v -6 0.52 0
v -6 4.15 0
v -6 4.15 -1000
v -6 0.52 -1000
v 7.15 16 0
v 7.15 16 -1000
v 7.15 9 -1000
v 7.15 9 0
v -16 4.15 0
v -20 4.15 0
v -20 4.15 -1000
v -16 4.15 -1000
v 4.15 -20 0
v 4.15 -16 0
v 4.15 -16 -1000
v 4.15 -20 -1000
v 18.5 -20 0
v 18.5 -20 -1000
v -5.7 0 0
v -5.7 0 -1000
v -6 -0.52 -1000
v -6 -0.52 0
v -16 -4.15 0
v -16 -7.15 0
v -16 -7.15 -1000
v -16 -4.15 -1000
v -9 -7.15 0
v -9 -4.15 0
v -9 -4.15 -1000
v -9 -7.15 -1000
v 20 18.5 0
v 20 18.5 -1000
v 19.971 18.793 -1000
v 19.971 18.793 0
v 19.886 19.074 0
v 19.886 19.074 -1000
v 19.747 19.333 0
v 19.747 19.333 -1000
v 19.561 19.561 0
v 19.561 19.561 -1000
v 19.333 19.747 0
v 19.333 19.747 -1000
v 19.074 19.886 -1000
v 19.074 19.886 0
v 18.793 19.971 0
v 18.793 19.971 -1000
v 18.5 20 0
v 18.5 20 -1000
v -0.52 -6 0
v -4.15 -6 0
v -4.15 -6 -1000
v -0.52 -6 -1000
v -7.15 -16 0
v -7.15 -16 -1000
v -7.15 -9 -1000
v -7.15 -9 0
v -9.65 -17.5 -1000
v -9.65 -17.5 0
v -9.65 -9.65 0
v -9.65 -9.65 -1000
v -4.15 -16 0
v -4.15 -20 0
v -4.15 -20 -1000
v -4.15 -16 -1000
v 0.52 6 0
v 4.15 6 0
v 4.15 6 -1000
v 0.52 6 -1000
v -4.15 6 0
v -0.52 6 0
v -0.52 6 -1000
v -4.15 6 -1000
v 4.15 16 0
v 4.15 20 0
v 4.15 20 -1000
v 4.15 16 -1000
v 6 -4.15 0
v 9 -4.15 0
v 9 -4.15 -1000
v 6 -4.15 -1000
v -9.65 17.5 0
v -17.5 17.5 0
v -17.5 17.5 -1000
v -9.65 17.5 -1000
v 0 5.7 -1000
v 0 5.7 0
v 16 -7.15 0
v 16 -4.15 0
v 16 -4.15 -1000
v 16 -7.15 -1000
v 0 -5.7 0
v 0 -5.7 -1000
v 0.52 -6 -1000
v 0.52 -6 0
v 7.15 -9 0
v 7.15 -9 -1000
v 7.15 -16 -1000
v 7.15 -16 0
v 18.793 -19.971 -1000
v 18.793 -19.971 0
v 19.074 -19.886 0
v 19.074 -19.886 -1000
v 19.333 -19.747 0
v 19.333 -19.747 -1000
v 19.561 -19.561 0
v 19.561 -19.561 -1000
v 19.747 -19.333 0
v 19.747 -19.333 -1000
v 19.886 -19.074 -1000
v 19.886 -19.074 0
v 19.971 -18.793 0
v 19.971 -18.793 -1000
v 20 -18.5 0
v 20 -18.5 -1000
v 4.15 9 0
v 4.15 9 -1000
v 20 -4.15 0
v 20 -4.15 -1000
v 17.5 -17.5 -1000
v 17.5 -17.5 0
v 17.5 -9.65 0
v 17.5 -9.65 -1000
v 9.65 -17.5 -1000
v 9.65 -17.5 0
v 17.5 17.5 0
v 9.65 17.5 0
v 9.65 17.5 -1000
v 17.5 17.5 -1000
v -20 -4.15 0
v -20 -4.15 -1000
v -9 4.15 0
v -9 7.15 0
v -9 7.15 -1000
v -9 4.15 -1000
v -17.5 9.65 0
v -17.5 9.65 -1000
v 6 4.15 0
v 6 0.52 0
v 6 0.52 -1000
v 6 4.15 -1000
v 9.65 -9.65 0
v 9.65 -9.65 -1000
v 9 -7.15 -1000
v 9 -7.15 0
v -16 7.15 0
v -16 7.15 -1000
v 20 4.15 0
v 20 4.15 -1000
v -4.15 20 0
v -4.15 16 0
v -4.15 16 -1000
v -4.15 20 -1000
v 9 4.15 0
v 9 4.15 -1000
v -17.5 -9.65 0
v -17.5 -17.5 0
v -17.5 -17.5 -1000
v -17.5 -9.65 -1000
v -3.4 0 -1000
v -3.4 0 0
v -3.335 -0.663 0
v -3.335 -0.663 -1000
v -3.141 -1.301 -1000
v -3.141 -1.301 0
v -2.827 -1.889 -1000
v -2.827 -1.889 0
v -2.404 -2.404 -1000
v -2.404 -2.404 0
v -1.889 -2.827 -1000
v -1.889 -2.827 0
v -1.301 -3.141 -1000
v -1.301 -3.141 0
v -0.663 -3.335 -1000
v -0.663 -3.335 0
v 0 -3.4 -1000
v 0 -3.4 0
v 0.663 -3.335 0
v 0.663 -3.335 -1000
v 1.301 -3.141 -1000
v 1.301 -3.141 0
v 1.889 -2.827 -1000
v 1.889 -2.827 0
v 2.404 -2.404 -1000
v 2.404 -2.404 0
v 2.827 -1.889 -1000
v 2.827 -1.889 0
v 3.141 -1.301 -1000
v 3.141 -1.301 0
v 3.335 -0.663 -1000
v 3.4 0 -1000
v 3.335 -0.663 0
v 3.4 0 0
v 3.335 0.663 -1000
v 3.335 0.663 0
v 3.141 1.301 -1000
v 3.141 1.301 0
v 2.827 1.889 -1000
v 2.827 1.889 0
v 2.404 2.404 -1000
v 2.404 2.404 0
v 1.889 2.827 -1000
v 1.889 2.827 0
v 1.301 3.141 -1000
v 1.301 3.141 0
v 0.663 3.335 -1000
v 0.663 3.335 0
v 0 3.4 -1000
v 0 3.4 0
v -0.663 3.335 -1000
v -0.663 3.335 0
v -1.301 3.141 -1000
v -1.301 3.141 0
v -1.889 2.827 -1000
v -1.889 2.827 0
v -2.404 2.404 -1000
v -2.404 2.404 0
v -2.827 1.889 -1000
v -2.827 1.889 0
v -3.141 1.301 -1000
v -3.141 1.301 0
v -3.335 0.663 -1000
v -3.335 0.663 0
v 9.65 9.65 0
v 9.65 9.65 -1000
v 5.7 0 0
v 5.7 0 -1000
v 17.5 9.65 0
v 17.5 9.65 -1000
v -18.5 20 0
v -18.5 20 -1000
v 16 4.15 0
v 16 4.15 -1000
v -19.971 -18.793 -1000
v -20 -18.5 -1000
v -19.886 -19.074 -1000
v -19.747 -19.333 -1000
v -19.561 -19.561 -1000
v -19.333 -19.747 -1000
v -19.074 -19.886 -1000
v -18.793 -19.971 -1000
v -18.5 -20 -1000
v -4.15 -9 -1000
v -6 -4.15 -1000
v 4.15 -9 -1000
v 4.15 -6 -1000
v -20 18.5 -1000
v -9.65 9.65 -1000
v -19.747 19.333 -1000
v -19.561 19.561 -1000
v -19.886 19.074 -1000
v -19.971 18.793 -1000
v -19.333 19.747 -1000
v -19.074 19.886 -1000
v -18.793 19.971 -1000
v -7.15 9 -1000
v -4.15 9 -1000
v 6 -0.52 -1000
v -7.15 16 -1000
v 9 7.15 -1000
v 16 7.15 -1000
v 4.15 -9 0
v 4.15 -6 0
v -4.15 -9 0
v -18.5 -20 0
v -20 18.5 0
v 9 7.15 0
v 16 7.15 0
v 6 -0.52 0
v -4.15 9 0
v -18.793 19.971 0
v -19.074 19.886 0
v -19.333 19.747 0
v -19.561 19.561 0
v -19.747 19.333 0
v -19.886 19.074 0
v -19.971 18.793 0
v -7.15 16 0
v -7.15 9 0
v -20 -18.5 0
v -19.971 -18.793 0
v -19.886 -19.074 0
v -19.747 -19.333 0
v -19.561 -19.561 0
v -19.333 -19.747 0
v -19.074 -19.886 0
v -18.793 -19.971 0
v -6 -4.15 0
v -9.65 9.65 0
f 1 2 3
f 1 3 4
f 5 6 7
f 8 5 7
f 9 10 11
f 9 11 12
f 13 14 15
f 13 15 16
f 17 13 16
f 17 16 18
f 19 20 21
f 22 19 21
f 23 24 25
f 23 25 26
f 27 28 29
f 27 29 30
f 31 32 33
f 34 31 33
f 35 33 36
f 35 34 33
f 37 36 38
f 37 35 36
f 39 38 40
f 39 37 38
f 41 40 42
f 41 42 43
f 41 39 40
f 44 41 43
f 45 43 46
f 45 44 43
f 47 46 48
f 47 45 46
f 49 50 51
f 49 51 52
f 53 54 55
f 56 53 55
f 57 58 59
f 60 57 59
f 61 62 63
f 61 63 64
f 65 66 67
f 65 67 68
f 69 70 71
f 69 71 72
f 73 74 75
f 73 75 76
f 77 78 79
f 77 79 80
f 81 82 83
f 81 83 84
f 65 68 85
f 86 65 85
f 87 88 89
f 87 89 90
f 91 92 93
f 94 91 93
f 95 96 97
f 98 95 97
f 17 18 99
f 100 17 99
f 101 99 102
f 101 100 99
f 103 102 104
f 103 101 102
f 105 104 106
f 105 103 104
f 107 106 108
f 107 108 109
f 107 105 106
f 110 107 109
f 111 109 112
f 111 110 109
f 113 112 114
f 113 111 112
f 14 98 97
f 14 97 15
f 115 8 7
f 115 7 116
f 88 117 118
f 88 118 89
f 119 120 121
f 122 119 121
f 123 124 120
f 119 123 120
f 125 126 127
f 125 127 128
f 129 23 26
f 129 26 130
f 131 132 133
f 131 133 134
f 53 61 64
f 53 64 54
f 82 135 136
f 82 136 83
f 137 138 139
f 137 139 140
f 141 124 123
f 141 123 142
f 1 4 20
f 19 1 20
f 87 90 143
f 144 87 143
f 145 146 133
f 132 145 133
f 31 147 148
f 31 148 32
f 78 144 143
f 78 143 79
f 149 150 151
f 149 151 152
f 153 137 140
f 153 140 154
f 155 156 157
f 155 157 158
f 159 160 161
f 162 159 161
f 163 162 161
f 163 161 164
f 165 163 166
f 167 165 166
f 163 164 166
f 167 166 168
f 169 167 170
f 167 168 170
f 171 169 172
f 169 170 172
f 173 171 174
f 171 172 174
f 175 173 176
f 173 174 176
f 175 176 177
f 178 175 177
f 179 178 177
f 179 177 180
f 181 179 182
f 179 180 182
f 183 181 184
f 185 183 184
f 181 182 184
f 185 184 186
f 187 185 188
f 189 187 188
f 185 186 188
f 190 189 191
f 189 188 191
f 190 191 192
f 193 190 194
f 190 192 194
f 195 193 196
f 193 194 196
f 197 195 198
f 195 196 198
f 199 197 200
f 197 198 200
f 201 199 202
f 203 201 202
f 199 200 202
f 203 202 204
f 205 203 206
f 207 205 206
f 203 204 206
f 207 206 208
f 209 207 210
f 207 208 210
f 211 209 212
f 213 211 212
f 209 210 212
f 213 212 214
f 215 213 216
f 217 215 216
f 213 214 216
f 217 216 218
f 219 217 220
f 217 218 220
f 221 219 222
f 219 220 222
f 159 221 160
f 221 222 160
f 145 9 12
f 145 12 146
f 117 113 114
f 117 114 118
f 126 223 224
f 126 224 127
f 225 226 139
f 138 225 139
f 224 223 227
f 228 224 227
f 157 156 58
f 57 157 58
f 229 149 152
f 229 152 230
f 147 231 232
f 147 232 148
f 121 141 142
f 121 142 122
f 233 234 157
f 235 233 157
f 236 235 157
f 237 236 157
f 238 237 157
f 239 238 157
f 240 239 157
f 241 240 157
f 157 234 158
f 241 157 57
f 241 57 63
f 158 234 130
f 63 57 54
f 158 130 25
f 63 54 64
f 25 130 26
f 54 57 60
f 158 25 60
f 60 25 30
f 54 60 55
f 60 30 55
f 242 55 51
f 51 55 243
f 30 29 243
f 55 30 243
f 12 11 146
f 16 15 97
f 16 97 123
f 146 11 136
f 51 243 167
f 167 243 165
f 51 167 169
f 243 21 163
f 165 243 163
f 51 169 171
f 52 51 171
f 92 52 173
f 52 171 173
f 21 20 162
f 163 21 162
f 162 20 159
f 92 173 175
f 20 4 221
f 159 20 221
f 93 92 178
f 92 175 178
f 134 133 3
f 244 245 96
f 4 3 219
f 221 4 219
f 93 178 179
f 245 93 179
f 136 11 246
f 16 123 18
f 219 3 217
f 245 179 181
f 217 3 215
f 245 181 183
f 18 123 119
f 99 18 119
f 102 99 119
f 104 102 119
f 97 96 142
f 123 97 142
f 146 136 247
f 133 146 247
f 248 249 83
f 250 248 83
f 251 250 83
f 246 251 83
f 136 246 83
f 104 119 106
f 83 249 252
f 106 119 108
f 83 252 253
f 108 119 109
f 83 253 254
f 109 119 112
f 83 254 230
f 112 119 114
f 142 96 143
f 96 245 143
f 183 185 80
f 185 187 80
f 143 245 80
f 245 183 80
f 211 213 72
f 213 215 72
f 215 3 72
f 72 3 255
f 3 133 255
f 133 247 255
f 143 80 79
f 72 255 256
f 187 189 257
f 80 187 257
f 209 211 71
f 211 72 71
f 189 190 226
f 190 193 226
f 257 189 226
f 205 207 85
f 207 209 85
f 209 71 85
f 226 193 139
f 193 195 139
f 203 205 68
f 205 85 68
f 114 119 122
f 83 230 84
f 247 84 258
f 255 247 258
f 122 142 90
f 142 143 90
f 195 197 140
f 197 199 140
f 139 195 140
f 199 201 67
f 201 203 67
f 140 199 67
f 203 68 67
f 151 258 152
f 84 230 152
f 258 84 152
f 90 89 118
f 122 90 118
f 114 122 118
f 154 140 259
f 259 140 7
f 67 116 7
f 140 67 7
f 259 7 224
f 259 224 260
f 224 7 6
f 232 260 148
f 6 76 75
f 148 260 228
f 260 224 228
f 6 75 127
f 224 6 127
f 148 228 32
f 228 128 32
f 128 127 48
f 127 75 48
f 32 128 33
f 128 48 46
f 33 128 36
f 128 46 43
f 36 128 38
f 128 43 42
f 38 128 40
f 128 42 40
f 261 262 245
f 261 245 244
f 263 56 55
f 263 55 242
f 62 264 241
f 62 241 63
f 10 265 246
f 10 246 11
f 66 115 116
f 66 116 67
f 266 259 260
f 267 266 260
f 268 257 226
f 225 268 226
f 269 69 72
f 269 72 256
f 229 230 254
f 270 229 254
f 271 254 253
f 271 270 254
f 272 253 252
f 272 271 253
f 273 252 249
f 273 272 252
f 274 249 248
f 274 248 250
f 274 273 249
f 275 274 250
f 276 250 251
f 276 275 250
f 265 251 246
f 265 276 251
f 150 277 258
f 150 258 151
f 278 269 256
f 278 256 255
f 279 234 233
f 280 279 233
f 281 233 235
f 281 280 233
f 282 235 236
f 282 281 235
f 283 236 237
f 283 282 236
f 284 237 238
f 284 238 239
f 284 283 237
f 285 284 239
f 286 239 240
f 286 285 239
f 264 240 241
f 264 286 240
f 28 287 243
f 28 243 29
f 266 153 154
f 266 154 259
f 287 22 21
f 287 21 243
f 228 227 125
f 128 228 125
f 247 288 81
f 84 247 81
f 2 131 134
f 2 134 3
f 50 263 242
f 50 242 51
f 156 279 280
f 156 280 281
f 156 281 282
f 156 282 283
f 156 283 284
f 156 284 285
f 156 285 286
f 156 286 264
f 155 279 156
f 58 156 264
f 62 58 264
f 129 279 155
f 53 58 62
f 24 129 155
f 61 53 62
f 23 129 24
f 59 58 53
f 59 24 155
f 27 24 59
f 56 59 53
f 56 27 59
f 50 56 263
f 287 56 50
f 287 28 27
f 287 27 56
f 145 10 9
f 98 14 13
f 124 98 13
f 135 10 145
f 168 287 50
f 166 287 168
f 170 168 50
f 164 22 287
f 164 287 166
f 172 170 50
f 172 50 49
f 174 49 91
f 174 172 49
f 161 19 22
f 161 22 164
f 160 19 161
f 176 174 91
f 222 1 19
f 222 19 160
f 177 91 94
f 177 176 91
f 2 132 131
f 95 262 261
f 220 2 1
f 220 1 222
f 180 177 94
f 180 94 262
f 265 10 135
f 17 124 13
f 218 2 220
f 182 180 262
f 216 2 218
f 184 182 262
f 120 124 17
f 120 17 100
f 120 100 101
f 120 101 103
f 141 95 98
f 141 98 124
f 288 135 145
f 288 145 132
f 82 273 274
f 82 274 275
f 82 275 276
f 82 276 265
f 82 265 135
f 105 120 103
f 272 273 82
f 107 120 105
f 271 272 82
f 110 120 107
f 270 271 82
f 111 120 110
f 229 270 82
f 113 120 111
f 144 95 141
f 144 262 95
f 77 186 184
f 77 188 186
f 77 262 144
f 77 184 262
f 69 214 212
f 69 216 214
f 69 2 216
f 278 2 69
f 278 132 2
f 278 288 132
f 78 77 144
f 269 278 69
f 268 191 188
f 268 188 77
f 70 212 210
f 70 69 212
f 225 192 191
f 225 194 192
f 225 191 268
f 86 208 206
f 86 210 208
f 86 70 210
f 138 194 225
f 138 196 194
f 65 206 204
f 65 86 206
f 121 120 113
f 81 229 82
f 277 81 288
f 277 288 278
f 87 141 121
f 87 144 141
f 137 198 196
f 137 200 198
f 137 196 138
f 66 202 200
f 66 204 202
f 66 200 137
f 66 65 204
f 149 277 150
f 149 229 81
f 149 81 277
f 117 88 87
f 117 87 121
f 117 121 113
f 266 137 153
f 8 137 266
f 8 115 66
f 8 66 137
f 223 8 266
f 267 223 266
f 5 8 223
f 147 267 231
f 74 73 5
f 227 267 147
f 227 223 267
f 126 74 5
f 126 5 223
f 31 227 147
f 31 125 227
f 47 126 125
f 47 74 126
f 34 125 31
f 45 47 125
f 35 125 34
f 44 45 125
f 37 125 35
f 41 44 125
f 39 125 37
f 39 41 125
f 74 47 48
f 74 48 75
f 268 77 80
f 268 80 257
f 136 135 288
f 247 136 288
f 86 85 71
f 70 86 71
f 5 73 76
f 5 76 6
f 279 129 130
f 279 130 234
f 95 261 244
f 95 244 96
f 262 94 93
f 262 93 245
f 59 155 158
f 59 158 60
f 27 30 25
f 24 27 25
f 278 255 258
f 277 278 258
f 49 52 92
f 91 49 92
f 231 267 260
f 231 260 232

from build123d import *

# Parameters (mm, degrees)
SKETCH1_R           = 3.4
SKETCH1_W           = 7.85
SKETCH1_H           = 7.85
BOSS_EXTRUDE1_DEPTH = 1000


with BuildPart() as part:
    # Sketch1 → Boss-Extrude1 (new body)
    with BuildSketch(Plane.XY):
        with BuildLine():
            Line((-7.15, 16), (-4.15, 16))
            Line((-4.15, 16), (-4.15, 20))
            Line((-4.15, 20), (-18.5, 20))
            ThreePointArc((-18.5, 20), (-19.560660172, 19.560660172), (-20, 18.5))
            Line((-20, 18.5), (-20, 4.15))
            Line((-20, 4.15), (-16, 4.15))
            Line((-16, 4.15), (-16, 7.15))
            Line((-16, 7.15), (-9, 7.15))
            Line((-9, 7.15), (-9, 4.15))
            Line((-9, 4.15), (-6, 4.15))
            Line((-6, 4.15), (-6, 0.519615242))
            Line((-6, 0.519615242), (-5.7, 0))
            Line((-5.7, 0), (-6, -0.519615242))
            Line((-6, -0.519615242), (-6, -4.15))
            Line((-6, -4.15), (-9, -4.15))
            Line((-9, -4.15), (-9, -7.15))
            Line((-9, -7.15), (-16, -7.15))
            Line((-16, -7.15), (-16, -4.15))
            Line((-16, -4.15), (-20, -4.15))
            Line((-20, -4.15), (-20, -18.5))
            ThreePointArc((-20, -18.5), (-19.560660172, -19.560660172), (-18.5, -20))
            Line((-18.5, -20), (-4.15, -20))
            Line((-4.15, -20), (-4.15, -16))
            Line((-4.15, -16), (-7.15, -16))
            Line((-7.15, -16), (-7.15, -9))
            Line((-7.15, -9), (-4.15, -9))
            Line((-4.15, -9), (-4.15, -6))
            Line((-4.15, -6), (-0.519615242, -6))
            Line((-0.519615242, -6), (0, -5.7))
            Line((0, -5.7), (0.519615242, -6))
            Line((0.519615242, -6), (4.15, -6))
            Line((4.15, -6), (4.15, -9))
            Line((4.15, -9), (7.15, -9))
            Line((7.15, -9), (7.15, -16))
            Line((7.15, -16), (4.15, -16))
            Line((4.15, -16), (4.15, -20))
            Line((4.15, -20), (18.5, -20))
            ThreePointArc((18.5, -20), (19.560660172, -19.560660172), (20, -18.5))
            Line((20, -18.5), (20, -4.15))
            Line((20, -4.15), (16, -4.15))
            Line((16, -4.15), (16, -7.15))
            Line((16, -7.15), (9, -7.15))
            Line((9, -7.15), (9, -4.15))
            Line((9, -4.15), (6, -4.15))
            Line((6, -4.15), (6, -0.519615242))
            Line((6, -0.519615242), (5.7, 0))
            Line((5.7, 0), (6, 0.519615242))
            Line((6, 0.519615242), (6, 4.15))
            Line((6, 4.15), (9, 4.15))
            Line((9, 4.15), (9, 7.15))
            Line((9, 7.15), (16, 7.15))
            Line((16, 7.15), (16, 4.15))
            Line((16, 4.15), (20, 4.15))
            Line((20, 4.15), (20, 18.5))
            ThreePointArc((20, 18.5), (19.560660172, 19.560660172), (18.5, 20))
            Line((18.5, 20), (4.15, 20))
            Line((4.15, 20), (4.15, 16))
            Line((4.15, 16), (7.15, 16))
            Line((7.15, 16), (7.15, 9))
            Line((7.15, 9), (4.15, 9))
            Line((4.15, 9), (4.15, 6))
            Line((4.15, 6), (0.519615242, 6))
            Line((0.519615242, 6), (0, 5.7))
            Line((0, 5.7), (-0.519615242, 6))
            Line((-0.519615242, 6), (-4.15, 6))
            Line((-4.15, 6), (-4.15, 9))
            Line((-4.15, 9), (-7.15, 9))
            Line((-7.15, 9), (-7.15, 16))
        make_face()
        with Locations(Location((0, 0, 0), (0, 0, 180))):
            Circle(SKETCH1_R, mode=Mode.SUBTRACT)
        with Locations((-13.575, 13.575)):
            Rectangle(SKETCH1_W, SKETCH1_H, mode=Mode.SUBTRACT)
        with Locations((13.575, 13.575)):
            Rectangle(SKETCH1_W, SKETCH1_H, mode=Mode.SUBTRACT)
        with Locations((-13.575, -13.575)):
            Rectangle(SKETCH1_W, SKETCH1_H, mode=Mode.SUBTRACT)
        with Locations((13.575, -13.575)):
            Rectangle(SKETCH1_W, SKETCH1_H, mode=Mode.SUBTRACT)
    extrude(amount=-BOSS_EXTRUDE1_DEPTH)


solid = part.part
